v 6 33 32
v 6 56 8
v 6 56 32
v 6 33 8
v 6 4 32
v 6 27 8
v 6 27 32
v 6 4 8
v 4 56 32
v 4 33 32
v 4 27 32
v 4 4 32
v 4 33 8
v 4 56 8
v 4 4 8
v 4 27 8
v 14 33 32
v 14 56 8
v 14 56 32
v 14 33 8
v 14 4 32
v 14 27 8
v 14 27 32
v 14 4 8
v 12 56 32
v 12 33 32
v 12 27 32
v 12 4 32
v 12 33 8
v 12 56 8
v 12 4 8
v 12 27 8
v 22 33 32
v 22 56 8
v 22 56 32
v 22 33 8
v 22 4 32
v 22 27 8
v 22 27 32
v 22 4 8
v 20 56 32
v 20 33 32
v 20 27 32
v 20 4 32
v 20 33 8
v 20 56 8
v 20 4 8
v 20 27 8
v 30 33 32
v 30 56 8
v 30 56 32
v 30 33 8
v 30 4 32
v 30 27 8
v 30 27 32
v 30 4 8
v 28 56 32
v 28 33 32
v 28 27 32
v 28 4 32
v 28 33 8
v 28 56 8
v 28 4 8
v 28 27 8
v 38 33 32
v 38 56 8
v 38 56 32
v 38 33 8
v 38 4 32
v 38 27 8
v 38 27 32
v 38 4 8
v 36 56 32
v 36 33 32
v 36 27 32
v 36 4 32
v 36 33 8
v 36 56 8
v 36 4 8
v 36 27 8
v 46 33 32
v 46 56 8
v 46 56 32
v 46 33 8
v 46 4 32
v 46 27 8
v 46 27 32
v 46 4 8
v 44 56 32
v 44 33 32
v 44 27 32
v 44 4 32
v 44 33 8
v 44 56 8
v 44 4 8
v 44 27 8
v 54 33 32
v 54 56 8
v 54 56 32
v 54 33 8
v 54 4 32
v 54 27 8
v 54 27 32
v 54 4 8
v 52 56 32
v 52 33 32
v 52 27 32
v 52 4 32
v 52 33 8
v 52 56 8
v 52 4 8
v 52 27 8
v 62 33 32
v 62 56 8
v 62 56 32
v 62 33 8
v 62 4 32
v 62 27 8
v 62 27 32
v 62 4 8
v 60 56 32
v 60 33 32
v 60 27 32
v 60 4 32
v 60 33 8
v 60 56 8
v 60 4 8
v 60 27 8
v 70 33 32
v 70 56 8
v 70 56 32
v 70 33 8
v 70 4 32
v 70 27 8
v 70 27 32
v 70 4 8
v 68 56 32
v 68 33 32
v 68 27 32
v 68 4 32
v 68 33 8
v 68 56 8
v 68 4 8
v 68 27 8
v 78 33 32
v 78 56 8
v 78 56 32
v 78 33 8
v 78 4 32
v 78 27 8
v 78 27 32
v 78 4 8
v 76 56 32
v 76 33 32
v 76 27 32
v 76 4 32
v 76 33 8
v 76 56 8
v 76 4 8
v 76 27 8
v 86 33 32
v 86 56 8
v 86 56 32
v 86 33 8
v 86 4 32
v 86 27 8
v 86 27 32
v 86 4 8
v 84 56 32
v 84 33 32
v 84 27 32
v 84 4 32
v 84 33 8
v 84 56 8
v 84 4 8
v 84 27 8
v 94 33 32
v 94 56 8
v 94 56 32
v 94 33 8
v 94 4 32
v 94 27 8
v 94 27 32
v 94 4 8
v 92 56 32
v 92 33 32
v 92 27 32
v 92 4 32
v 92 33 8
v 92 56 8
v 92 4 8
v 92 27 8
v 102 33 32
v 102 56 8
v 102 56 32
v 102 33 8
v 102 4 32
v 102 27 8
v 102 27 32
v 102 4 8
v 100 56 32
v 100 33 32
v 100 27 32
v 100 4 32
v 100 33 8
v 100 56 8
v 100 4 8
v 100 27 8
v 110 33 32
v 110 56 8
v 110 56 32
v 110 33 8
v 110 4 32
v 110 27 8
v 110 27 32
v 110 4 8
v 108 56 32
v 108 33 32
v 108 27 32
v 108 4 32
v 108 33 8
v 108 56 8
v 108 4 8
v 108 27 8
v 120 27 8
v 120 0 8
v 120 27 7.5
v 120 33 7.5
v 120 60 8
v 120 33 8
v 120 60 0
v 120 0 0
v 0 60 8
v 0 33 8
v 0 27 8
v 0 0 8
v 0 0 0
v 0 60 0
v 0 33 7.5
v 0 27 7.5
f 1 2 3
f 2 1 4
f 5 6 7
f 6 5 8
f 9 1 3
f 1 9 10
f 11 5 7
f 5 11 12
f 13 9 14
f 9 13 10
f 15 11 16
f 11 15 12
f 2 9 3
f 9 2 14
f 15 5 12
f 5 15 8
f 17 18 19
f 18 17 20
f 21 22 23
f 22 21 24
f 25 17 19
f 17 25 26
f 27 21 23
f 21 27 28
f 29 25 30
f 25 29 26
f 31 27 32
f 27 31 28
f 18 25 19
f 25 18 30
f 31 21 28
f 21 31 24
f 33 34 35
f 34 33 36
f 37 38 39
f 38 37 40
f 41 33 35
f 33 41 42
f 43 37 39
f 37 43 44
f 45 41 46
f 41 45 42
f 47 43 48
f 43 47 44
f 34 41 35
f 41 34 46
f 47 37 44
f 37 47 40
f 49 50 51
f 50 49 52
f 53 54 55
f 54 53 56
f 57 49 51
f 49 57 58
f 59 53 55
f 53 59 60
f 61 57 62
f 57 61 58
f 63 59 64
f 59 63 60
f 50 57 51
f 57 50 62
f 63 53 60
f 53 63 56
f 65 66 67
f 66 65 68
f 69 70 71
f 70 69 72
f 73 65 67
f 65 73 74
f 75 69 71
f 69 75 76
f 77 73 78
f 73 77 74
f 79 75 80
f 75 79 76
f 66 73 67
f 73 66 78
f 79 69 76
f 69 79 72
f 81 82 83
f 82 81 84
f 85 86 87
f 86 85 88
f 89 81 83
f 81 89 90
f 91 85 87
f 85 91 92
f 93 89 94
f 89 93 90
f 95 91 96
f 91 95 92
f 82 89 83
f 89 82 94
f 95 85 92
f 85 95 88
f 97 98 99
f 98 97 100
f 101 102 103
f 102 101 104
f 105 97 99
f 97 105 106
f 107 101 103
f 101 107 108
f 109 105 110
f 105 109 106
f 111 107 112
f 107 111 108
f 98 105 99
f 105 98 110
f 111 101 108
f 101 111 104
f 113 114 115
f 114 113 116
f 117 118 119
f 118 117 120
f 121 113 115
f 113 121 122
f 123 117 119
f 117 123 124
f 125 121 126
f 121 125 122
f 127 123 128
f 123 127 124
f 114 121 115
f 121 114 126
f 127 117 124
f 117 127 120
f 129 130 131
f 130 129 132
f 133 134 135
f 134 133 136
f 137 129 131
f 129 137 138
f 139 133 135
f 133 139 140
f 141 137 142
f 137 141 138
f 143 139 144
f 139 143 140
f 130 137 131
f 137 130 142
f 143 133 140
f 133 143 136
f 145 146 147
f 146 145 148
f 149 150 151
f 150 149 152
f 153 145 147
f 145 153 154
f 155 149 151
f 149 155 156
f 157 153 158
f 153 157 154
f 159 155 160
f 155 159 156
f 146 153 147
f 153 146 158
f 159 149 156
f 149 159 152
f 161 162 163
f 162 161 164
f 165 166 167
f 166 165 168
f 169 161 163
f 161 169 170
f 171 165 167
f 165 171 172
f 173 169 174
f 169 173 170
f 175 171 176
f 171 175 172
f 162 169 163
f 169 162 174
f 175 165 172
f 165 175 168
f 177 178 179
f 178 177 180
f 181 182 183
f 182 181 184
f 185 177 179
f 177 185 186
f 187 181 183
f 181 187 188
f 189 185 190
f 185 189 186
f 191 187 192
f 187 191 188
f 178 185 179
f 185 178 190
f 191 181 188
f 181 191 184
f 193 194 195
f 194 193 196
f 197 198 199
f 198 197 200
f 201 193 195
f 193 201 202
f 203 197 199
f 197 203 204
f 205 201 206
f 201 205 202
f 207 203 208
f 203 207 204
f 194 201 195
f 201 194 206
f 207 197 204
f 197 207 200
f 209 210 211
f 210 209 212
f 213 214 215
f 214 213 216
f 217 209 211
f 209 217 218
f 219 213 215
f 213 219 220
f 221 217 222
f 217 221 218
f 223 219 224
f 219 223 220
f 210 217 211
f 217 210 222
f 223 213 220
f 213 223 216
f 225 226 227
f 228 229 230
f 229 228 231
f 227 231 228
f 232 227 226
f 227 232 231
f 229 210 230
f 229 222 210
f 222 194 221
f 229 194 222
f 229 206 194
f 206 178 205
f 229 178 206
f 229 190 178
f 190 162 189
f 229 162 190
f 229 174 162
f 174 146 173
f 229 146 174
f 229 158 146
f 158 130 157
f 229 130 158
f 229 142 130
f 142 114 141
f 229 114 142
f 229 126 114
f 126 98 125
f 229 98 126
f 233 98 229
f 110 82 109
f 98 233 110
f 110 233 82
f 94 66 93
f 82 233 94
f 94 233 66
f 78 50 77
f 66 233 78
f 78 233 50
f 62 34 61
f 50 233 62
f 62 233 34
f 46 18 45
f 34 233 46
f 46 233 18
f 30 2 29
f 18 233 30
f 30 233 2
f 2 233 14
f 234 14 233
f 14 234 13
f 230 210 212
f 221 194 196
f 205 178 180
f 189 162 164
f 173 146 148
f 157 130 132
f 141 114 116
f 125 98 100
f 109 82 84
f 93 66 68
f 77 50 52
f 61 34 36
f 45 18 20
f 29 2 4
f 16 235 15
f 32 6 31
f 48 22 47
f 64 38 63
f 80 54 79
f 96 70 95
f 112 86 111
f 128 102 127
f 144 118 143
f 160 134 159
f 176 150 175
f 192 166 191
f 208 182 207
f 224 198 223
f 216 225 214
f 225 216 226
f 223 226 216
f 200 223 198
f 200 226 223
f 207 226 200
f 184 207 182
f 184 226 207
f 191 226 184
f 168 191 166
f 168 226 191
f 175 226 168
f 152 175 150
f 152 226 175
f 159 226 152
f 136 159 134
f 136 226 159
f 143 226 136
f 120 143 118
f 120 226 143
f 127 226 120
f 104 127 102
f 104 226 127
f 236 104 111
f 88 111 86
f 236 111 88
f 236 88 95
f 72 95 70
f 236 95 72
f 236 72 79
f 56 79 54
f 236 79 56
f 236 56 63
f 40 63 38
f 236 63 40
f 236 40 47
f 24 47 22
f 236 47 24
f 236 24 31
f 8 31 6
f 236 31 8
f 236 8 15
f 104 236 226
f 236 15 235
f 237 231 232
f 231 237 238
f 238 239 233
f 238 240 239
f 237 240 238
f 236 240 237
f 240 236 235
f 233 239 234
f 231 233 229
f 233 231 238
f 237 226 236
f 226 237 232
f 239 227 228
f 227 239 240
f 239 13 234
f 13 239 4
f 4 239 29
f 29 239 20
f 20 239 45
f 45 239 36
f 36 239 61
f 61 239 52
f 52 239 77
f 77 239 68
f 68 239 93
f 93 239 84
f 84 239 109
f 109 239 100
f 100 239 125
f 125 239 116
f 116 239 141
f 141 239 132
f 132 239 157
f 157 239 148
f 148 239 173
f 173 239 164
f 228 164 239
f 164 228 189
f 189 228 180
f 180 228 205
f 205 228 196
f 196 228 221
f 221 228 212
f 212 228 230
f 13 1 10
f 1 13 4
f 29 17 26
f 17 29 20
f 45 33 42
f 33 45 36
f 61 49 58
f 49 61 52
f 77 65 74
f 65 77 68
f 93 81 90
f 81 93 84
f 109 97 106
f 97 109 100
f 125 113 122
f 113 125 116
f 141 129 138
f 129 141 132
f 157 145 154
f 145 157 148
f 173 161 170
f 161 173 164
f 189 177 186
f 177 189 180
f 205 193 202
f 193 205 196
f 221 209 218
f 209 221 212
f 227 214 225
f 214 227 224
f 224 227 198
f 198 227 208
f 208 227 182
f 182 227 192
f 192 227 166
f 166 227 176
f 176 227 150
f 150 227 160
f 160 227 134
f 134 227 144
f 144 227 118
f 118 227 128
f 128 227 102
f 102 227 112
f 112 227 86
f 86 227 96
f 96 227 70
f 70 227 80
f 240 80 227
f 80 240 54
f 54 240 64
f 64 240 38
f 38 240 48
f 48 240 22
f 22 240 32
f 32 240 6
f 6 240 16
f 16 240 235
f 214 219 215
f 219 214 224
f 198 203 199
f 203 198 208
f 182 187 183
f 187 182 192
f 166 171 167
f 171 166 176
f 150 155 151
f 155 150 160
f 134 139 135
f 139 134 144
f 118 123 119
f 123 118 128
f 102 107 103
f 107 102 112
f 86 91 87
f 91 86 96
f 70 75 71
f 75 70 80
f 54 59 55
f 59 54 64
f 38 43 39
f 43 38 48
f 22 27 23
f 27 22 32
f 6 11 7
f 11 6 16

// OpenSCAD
$fn = 32;

// ----------------------------------------------------------------------
// Heatsink: slotted fin block
// ----------------------------------------------------------------------

// --- parameters (mm) ---
base_l = 120;             // base length, X
base_w = 60;              // base width, Y
base_t = 8;               // base plate thickness
fin_h = 25;               // fin height above the base
fin_t = 2;                // fin thickness
edge = 4;                 // margin from the base ends
pitch = 8;                // fin pitch
slot_w = 6;               // central slot width, Y

n_fins = floor((base_l - 2 * edge - fin_t) / pitch) + 1;  // fin count
total_h = base_t + fin_h - 1;  // overall height

difference() {
union() {
  cube([base_l, base_w, base_t]);
  for (i = [0 : n_fins - 1])
    translate([edge + i * pitch, edge, base_t - 1])
      cube([fin_t, base_w - 2 * edge, fin_h]);
}
  translate([-1, base_w / 2 - slot_w / 2, base_t - 0.5])
    cube([base_l + 2, slot_w, fin_h + 2]);
}
